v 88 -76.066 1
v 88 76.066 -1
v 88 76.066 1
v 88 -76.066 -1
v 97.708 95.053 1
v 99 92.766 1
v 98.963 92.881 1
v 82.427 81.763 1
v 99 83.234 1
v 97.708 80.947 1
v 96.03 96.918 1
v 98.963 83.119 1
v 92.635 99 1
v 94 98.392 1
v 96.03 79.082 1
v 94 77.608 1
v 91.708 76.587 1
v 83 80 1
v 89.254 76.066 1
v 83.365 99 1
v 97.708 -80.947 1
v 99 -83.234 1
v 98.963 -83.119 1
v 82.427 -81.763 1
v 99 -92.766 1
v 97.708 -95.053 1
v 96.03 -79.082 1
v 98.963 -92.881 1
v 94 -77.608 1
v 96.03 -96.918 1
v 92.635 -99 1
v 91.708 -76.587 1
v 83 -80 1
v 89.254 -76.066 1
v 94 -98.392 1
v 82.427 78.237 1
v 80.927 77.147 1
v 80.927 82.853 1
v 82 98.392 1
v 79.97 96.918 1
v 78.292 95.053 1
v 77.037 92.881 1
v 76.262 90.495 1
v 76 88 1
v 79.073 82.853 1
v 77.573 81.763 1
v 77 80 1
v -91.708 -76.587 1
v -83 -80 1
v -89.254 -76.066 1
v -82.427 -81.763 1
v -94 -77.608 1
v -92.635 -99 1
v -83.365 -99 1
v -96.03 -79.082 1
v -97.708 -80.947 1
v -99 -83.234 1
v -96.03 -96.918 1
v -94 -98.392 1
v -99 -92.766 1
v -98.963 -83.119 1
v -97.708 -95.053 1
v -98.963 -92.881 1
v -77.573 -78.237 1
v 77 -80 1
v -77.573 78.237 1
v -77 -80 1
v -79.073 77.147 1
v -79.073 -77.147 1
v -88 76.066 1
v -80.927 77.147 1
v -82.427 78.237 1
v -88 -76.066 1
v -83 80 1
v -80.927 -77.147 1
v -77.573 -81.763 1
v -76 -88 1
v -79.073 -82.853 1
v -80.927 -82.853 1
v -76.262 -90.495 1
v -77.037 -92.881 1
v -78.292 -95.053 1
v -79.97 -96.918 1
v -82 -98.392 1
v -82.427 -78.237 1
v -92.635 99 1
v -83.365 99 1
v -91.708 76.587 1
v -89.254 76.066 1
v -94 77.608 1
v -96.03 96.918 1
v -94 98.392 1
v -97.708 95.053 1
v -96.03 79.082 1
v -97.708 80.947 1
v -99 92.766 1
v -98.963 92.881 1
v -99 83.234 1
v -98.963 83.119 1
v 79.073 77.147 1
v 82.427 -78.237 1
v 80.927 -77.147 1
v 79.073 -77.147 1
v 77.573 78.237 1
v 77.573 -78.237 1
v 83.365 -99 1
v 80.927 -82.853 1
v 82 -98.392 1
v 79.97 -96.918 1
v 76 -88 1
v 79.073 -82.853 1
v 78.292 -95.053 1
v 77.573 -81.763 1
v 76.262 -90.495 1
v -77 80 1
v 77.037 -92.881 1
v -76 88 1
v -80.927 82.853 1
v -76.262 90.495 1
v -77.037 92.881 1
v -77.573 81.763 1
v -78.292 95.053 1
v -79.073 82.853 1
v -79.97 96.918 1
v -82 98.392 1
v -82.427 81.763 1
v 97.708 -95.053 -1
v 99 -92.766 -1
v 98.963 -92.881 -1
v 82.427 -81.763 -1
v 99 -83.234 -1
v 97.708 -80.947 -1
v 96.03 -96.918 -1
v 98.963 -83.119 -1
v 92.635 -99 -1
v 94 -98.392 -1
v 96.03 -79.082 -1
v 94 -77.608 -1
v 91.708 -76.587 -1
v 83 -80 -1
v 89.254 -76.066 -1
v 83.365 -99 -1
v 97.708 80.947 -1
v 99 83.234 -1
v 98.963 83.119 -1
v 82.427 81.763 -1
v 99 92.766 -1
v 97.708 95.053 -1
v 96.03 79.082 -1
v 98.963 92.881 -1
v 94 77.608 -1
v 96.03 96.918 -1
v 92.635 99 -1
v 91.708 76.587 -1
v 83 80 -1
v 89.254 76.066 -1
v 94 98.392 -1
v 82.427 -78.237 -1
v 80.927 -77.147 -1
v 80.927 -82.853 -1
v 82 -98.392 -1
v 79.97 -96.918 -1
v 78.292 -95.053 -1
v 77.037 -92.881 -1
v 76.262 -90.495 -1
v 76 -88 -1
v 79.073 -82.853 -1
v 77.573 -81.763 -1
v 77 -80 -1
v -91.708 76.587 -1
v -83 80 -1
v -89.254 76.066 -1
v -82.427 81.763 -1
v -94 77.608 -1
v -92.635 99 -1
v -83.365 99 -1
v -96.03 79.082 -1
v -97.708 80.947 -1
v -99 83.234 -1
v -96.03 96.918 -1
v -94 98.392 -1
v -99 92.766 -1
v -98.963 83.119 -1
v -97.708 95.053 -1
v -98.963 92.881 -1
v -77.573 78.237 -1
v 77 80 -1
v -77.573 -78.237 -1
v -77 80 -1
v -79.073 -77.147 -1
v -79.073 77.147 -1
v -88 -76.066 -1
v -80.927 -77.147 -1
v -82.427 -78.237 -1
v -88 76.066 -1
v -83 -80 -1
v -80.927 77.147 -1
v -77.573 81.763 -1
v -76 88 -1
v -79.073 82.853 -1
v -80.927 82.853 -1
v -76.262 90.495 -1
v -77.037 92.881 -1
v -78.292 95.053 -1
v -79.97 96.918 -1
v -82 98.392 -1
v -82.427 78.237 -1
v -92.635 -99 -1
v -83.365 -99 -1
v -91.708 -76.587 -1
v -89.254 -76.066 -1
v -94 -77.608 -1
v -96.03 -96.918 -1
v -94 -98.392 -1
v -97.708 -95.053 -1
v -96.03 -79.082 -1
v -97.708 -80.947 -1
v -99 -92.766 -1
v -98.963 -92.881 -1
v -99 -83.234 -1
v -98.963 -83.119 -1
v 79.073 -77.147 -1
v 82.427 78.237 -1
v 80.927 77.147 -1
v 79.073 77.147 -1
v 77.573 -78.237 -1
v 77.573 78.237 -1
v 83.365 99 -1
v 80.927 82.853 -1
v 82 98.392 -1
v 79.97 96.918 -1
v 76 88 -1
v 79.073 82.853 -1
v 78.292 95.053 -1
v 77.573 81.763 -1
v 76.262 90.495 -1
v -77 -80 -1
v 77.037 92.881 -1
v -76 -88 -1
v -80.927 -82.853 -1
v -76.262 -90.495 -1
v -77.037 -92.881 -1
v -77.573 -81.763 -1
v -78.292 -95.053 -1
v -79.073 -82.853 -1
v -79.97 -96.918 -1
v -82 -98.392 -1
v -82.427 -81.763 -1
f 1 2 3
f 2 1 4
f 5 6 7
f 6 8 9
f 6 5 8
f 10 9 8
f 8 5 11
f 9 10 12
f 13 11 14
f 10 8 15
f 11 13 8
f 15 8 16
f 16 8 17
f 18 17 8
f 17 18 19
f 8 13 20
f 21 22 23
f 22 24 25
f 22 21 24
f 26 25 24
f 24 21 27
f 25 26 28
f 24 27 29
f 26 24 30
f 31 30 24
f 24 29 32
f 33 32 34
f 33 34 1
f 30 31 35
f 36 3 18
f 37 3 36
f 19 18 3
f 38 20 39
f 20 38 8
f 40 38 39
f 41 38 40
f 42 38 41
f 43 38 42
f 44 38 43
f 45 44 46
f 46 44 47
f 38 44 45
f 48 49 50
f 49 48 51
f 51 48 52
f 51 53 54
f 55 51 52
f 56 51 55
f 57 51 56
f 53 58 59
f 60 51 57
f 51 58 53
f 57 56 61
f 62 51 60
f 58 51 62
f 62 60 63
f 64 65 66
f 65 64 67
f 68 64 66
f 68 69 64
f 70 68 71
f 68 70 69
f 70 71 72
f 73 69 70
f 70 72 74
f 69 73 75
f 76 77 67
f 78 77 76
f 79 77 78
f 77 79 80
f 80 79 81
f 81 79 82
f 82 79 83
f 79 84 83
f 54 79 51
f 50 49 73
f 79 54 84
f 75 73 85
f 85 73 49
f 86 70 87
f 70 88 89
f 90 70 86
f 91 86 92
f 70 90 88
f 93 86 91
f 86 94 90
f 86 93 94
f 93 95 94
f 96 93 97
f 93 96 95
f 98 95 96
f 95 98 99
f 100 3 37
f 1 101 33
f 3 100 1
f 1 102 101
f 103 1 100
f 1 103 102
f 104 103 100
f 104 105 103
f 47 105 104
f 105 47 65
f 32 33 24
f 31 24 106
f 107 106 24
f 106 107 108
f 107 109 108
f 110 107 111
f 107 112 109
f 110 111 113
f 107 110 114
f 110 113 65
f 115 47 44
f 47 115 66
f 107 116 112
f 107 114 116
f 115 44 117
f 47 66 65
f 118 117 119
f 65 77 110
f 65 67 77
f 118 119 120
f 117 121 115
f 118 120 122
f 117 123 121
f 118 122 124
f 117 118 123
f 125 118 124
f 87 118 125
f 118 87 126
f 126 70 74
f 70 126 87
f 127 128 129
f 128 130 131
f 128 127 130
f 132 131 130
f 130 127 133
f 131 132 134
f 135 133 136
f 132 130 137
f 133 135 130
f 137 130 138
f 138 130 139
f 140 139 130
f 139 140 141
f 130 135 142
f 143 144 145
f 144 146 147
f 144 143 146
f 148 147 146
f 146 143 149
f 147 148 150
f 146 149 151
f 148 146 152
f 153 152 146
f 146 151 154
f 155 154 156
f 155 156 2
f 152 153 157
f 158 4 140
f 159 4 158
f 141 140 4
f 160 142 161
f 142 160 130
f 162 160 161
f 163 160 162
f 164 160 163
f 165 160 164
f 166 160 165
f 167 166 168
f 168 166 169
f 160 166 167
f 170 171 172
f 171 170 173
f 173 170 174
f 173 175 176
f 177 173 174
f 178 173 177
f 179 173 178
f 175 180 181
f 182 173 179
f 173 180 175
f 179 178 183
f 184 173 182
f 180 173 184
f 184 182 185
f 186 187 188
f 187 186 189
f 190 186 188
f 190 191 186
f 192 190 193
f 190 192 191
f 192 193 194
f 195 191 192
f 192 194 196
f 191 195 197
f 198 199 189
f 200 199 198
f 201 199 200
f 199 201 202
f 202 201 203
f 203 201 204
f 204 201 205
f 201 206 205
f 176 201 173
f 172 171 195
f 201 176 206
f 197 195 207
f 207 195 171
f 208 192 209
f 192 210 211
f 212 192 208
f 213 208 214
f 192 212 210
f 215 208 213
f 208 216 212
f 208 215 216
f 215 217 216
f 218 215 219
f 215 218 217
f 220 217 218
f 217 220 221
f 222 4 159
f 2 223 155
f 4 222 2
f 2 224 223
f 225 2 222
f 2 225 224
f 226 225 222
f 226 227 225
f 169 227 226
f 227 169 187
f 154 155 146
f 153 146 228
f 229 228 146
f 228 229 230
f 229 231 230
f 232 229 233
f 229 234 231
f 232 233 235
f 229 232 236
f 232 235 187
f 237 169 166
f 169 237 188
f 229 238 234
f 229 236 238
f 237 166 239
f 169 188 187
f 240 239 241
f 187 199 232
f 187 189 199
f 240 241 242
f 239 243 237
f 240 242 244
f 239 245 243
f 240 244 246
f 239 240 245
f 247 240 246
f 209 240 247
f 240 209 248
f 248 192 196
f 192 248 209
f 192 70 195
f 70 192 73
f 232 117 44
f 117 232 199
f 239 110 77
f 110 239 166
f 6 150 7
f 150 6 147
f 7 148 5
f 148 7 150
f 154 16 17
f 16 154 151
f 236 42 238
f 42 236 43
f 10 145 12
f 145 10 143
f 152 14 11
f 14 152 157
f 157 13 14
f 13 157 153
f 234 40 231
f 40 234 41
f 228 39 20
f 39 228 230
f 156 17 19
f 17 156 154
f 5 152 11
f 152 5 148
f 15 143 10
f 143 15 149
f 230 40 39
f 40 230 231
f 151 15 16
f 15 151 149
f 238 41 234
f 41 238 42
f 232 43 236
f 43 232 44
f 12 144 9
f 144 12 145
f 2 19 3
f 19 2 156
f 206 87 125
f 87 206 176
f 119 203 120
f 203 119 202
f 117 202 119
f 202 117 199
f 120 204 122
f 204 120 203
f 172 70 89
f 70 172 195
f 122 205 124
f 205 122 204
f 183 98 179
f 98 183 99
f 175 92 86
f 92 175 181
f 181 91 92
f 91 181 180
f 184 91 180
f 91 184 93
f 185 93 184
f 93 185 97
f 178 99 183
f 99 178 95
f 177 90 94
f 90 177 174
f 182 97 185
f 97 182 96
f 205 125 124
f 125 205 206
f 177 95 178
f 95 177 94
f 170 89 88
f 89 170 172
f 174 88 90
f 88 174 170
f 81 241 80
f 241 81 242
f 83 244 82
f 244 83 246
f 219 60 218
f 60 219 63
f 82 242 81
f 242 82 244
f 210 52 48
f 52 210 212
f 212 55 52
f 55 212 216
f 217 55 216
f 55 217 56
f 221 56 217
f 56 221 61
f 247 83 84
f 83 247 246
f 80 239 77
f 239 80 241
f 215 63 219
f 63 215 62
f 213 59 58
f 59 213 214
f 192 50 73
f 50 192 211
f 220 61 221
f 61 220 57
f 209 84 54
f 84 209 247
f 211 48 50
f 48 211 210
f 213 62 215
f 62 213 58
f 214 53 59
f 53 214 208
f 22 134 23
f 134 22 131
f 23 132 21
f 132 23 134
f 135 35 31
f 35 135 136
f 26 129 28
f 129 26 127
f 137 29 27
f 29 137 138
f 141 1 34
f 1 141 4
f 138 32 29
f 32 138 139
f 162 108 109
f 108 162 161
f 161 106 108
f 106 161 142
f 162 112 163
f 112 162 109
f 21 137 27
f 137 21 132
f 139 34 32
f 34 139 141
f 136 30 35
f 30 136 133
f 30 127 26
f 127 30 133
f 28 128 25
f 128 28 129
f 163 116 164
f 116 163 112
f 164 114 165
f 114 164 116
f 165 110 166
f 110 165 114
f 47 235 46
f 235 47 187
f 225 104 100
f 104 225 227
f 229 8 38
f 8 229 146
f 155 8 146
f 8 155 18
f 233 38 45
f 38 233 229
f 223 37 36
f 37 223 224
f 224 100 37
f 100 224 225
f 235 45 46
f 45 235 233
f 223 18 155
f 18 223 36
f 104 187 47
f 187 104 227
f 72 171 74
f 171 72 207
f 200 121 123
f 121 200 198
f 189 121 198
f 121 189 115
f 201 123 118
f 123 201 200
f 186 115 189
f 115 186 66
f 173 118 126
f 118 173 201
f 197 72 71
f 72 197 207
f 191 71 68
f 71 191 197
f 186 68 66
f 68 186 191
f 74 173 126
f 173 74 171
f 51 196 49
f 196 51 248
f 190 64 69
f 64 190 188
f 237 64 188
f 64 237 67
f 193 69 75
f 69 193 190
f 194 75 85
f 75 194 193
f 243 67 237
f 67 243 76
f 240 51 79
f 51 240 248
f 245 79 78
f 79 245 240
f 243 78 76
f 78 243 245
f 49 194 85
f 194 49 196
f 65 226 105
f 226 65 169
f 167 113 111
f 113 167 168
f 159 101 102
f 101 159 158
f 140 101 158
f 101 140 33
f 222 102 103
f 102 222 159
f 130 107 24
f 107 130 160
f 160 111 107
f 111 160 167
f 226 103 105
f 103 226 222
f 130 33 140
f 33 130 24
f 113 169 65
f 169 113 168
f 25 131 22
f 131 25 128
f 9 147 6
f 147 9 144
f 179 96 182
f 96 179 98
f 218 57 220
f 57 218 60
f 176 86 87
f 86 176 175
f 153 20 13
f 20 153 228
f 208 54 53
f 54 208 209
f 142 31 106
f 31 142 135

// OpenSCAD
// Parameters
sheet_length = 200; //[100:400:1]
sheet_width = 200; //[100:400:1]
sheet_thickness = 2; //[1:6:0.5]
corner_radius = 12; //[6:24:1]
hole_diameter = 6; //[3:12:0.5]
hole_edge_offset = 20; //[10:40:1]
chamfer_size = 1; //[0.5:3:0.25]
overlap = 1; //[0.5:2:0.5]

// Base shapes
module sheet_body() {
  cube([sheet_length, sheet_width, sheet_thickness], center=true);
}

module rounded_corners_base() {
  cube([sheet_length - 2*corner_radius, sheet_width - 2*corner_radius, sheet_thickness], center=true);
}

module rounded_corner_cyl(pos) {
  translate(pos)
    cylinder(r=corner_radius, h=sheet_thickness, center=true);
}

module mounting_hole(pos) {
  translate(pos)
    cylinder(r=hole_diameter/2, h=sheet_thickness + 2*overlap, center=true);
}

module chamfer_wedge_x(pos) {
  translate(pos)
    cube([chamfer_size, sheet_width + 2*overlap, sheet_thickness + 2*overlap], center=true);
}

module chamfer_wedge_y(pos) {
  translate(pos)
    cube([sheet_length + 2*overlap, chamfer_size, sheet_thickness + 2*overlap], center=true);
}

// Operations
module rounded_corners() {
  union() {
    rounded_corners_base();
    rounded_corner_cyl([sheet_length/2 - corner_radius, sheet_width/2 - corner_radius, 0]);
    rounded_corner_cyl([-sheet_length/2 + corner_radius, sheet_width/2 - corner_radius, 0]);
    rounded_corner_cyl([-sheet_length/2 + corner_radius, -sheet_width/2 + corner_radius, 0]);
    rounded_corner_cyl([sheet_length/2 - corner_radius, -sheet_width/2 + corner_radius, 0]);
  }
}

module mounting_holes() {
  union() {
    mounting_hole([sheet_length/2 - hole_edge_offset, sheet_width/2 - hole_edge_offset, 0]);
    mounting_hole([-sheet_length/2 + hole_edge_offset, sheet_width/2 - hole_edge_offset, 0]);
    mounting_hole([-sheet_length/2 + hole_edge_offset, -sheet_width/2 + hole_edge_offset, 0]);
    mounting_hole([sheet_length/2 - hole_edge_offset, -sheet_width/2 + hole_edge_offset, 0]);
  }
}

module chamfer_edges() {
  union() {
    chamfer_wedge_x([sheet_length/2 - chamfer_size/2, 0, 0]);
    chamfer_wedge_x([-sheet_length/2 + chamfer_size/2, 0, 0]);
    chamfer_wedge_y([0, sheet_width/2 - chamfer_size/2, 0]);
    chamfer_wedge_y([0, -sheet_width/2 + chamfer_size/2, 0]);
  }
}

// Final model
module complete_model() {
  difference() {
    intersection() {
      sheet_body();
      rounded_corners();
    }
    mounting_holes();
    chamfer_edges();
  }
}

// Render the final output
color("Silver") complete_model();
